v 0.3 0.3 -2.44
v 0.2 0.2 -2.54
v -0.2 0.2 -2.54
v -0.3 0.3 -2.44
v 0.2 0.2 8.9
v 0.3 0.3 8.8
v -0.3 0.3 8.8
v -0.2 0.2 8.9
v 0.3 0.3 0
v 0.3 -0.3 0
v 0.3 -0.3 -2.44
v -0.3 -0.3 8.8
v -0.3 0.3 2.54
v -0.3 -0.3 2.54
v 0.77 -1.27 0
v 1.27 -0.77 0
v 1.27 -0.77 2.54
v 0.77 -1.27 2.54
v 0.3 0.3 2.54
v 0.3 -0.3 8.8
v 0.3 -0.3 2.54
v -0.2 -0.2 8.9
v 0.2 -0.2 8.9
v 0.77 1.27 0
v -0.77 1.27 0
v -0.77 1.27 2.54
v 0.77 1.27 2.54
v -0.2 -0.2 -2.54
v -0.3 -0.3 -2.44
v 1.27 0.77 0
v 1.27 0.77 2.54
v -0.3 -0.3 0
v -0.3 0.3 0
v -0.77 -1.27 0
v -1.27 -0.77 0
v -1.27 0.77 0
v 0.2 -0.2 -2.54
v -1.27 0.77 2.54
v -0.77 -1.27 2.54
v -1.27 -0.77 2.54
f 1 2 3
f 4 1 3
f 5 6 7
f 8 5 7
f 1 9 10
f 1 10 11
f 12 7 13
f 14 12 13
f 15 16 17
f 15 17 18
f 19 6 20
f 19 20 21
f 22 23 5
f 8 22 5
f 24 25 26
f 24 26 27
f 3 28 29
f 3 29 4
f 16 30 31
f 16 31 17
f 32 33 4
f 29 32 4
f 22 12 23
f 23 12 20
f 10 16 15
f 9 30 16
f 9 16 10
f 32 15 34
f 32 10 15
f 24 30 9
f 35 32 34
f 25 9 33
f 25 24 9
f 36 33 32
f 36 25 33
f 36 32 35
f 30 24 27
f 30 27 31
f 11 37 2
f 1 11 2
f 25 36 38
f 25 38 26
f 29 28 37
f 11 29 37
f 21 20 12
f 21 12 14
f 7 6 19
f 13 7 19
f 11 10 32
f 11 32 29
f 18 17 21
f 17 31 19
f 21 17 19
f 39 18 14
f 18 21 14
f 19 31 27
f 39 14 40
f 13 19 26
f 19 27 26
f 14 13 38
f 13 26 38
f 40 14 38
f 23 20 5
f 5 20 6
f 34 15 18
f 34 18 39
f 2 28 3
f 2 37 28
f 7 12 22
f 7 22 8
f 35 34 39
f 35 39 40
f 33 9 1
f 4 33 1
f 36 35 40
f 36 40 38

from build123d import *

# Parameters (mm, degrees)
PLASTIC_DEPTH = 2.54
SKETCH2_W     = 11.44
SKETCH2_H     = 0.6
CONTACT_DEPTH = 0.3
CHAMFER1_SIZE = 0.1


with BuildPart() as part:
    # Sketch1 → Plastic (new body)
    with BuildSketch(Plane.XY):
        Polygon((-0.77, 1.27), (0.77, 1.27), (1.27, 0.77), (1.27, -0.77), (0.77, -1.27), (-0.77, -1.27), (-1.27, -0.77), (-1.27, 0.77), align=None)
    extrude(amount=PLASTIC_DEPTH)

    # Sketch2 → Contact (add, symmetric)
    with BuildSketch(Plane(origin=(0, 0, 0), x_dir=(0, 0, -1), z_dir=(1, 0, 0))):
        with Locations((-3.18, 0)):
            Rectangle(SKETCH2_W, SKETCH2_H)
    extrude(amount=CONTACT_DEPTH, both=True)

    # Chamfer1
    chamfer1_edges = [part.edges().sort_by_distance(p)[0] for p in [
        (0, -0.3, 8.9),
        (0.3, 0, 8.9),
        (-0.3, 0, -2.54),
        (0, -0.3, -2.54),
        (0, 0.3, -2.54),
        (-0.3, 0, 8.9),
        (0, 0.3, 8.9),
        (0.3, 0, -2.54),
    ]]
    chamfer(chamfer1_edges, length=CHAMFER1_SIZE)


solid = part.part
